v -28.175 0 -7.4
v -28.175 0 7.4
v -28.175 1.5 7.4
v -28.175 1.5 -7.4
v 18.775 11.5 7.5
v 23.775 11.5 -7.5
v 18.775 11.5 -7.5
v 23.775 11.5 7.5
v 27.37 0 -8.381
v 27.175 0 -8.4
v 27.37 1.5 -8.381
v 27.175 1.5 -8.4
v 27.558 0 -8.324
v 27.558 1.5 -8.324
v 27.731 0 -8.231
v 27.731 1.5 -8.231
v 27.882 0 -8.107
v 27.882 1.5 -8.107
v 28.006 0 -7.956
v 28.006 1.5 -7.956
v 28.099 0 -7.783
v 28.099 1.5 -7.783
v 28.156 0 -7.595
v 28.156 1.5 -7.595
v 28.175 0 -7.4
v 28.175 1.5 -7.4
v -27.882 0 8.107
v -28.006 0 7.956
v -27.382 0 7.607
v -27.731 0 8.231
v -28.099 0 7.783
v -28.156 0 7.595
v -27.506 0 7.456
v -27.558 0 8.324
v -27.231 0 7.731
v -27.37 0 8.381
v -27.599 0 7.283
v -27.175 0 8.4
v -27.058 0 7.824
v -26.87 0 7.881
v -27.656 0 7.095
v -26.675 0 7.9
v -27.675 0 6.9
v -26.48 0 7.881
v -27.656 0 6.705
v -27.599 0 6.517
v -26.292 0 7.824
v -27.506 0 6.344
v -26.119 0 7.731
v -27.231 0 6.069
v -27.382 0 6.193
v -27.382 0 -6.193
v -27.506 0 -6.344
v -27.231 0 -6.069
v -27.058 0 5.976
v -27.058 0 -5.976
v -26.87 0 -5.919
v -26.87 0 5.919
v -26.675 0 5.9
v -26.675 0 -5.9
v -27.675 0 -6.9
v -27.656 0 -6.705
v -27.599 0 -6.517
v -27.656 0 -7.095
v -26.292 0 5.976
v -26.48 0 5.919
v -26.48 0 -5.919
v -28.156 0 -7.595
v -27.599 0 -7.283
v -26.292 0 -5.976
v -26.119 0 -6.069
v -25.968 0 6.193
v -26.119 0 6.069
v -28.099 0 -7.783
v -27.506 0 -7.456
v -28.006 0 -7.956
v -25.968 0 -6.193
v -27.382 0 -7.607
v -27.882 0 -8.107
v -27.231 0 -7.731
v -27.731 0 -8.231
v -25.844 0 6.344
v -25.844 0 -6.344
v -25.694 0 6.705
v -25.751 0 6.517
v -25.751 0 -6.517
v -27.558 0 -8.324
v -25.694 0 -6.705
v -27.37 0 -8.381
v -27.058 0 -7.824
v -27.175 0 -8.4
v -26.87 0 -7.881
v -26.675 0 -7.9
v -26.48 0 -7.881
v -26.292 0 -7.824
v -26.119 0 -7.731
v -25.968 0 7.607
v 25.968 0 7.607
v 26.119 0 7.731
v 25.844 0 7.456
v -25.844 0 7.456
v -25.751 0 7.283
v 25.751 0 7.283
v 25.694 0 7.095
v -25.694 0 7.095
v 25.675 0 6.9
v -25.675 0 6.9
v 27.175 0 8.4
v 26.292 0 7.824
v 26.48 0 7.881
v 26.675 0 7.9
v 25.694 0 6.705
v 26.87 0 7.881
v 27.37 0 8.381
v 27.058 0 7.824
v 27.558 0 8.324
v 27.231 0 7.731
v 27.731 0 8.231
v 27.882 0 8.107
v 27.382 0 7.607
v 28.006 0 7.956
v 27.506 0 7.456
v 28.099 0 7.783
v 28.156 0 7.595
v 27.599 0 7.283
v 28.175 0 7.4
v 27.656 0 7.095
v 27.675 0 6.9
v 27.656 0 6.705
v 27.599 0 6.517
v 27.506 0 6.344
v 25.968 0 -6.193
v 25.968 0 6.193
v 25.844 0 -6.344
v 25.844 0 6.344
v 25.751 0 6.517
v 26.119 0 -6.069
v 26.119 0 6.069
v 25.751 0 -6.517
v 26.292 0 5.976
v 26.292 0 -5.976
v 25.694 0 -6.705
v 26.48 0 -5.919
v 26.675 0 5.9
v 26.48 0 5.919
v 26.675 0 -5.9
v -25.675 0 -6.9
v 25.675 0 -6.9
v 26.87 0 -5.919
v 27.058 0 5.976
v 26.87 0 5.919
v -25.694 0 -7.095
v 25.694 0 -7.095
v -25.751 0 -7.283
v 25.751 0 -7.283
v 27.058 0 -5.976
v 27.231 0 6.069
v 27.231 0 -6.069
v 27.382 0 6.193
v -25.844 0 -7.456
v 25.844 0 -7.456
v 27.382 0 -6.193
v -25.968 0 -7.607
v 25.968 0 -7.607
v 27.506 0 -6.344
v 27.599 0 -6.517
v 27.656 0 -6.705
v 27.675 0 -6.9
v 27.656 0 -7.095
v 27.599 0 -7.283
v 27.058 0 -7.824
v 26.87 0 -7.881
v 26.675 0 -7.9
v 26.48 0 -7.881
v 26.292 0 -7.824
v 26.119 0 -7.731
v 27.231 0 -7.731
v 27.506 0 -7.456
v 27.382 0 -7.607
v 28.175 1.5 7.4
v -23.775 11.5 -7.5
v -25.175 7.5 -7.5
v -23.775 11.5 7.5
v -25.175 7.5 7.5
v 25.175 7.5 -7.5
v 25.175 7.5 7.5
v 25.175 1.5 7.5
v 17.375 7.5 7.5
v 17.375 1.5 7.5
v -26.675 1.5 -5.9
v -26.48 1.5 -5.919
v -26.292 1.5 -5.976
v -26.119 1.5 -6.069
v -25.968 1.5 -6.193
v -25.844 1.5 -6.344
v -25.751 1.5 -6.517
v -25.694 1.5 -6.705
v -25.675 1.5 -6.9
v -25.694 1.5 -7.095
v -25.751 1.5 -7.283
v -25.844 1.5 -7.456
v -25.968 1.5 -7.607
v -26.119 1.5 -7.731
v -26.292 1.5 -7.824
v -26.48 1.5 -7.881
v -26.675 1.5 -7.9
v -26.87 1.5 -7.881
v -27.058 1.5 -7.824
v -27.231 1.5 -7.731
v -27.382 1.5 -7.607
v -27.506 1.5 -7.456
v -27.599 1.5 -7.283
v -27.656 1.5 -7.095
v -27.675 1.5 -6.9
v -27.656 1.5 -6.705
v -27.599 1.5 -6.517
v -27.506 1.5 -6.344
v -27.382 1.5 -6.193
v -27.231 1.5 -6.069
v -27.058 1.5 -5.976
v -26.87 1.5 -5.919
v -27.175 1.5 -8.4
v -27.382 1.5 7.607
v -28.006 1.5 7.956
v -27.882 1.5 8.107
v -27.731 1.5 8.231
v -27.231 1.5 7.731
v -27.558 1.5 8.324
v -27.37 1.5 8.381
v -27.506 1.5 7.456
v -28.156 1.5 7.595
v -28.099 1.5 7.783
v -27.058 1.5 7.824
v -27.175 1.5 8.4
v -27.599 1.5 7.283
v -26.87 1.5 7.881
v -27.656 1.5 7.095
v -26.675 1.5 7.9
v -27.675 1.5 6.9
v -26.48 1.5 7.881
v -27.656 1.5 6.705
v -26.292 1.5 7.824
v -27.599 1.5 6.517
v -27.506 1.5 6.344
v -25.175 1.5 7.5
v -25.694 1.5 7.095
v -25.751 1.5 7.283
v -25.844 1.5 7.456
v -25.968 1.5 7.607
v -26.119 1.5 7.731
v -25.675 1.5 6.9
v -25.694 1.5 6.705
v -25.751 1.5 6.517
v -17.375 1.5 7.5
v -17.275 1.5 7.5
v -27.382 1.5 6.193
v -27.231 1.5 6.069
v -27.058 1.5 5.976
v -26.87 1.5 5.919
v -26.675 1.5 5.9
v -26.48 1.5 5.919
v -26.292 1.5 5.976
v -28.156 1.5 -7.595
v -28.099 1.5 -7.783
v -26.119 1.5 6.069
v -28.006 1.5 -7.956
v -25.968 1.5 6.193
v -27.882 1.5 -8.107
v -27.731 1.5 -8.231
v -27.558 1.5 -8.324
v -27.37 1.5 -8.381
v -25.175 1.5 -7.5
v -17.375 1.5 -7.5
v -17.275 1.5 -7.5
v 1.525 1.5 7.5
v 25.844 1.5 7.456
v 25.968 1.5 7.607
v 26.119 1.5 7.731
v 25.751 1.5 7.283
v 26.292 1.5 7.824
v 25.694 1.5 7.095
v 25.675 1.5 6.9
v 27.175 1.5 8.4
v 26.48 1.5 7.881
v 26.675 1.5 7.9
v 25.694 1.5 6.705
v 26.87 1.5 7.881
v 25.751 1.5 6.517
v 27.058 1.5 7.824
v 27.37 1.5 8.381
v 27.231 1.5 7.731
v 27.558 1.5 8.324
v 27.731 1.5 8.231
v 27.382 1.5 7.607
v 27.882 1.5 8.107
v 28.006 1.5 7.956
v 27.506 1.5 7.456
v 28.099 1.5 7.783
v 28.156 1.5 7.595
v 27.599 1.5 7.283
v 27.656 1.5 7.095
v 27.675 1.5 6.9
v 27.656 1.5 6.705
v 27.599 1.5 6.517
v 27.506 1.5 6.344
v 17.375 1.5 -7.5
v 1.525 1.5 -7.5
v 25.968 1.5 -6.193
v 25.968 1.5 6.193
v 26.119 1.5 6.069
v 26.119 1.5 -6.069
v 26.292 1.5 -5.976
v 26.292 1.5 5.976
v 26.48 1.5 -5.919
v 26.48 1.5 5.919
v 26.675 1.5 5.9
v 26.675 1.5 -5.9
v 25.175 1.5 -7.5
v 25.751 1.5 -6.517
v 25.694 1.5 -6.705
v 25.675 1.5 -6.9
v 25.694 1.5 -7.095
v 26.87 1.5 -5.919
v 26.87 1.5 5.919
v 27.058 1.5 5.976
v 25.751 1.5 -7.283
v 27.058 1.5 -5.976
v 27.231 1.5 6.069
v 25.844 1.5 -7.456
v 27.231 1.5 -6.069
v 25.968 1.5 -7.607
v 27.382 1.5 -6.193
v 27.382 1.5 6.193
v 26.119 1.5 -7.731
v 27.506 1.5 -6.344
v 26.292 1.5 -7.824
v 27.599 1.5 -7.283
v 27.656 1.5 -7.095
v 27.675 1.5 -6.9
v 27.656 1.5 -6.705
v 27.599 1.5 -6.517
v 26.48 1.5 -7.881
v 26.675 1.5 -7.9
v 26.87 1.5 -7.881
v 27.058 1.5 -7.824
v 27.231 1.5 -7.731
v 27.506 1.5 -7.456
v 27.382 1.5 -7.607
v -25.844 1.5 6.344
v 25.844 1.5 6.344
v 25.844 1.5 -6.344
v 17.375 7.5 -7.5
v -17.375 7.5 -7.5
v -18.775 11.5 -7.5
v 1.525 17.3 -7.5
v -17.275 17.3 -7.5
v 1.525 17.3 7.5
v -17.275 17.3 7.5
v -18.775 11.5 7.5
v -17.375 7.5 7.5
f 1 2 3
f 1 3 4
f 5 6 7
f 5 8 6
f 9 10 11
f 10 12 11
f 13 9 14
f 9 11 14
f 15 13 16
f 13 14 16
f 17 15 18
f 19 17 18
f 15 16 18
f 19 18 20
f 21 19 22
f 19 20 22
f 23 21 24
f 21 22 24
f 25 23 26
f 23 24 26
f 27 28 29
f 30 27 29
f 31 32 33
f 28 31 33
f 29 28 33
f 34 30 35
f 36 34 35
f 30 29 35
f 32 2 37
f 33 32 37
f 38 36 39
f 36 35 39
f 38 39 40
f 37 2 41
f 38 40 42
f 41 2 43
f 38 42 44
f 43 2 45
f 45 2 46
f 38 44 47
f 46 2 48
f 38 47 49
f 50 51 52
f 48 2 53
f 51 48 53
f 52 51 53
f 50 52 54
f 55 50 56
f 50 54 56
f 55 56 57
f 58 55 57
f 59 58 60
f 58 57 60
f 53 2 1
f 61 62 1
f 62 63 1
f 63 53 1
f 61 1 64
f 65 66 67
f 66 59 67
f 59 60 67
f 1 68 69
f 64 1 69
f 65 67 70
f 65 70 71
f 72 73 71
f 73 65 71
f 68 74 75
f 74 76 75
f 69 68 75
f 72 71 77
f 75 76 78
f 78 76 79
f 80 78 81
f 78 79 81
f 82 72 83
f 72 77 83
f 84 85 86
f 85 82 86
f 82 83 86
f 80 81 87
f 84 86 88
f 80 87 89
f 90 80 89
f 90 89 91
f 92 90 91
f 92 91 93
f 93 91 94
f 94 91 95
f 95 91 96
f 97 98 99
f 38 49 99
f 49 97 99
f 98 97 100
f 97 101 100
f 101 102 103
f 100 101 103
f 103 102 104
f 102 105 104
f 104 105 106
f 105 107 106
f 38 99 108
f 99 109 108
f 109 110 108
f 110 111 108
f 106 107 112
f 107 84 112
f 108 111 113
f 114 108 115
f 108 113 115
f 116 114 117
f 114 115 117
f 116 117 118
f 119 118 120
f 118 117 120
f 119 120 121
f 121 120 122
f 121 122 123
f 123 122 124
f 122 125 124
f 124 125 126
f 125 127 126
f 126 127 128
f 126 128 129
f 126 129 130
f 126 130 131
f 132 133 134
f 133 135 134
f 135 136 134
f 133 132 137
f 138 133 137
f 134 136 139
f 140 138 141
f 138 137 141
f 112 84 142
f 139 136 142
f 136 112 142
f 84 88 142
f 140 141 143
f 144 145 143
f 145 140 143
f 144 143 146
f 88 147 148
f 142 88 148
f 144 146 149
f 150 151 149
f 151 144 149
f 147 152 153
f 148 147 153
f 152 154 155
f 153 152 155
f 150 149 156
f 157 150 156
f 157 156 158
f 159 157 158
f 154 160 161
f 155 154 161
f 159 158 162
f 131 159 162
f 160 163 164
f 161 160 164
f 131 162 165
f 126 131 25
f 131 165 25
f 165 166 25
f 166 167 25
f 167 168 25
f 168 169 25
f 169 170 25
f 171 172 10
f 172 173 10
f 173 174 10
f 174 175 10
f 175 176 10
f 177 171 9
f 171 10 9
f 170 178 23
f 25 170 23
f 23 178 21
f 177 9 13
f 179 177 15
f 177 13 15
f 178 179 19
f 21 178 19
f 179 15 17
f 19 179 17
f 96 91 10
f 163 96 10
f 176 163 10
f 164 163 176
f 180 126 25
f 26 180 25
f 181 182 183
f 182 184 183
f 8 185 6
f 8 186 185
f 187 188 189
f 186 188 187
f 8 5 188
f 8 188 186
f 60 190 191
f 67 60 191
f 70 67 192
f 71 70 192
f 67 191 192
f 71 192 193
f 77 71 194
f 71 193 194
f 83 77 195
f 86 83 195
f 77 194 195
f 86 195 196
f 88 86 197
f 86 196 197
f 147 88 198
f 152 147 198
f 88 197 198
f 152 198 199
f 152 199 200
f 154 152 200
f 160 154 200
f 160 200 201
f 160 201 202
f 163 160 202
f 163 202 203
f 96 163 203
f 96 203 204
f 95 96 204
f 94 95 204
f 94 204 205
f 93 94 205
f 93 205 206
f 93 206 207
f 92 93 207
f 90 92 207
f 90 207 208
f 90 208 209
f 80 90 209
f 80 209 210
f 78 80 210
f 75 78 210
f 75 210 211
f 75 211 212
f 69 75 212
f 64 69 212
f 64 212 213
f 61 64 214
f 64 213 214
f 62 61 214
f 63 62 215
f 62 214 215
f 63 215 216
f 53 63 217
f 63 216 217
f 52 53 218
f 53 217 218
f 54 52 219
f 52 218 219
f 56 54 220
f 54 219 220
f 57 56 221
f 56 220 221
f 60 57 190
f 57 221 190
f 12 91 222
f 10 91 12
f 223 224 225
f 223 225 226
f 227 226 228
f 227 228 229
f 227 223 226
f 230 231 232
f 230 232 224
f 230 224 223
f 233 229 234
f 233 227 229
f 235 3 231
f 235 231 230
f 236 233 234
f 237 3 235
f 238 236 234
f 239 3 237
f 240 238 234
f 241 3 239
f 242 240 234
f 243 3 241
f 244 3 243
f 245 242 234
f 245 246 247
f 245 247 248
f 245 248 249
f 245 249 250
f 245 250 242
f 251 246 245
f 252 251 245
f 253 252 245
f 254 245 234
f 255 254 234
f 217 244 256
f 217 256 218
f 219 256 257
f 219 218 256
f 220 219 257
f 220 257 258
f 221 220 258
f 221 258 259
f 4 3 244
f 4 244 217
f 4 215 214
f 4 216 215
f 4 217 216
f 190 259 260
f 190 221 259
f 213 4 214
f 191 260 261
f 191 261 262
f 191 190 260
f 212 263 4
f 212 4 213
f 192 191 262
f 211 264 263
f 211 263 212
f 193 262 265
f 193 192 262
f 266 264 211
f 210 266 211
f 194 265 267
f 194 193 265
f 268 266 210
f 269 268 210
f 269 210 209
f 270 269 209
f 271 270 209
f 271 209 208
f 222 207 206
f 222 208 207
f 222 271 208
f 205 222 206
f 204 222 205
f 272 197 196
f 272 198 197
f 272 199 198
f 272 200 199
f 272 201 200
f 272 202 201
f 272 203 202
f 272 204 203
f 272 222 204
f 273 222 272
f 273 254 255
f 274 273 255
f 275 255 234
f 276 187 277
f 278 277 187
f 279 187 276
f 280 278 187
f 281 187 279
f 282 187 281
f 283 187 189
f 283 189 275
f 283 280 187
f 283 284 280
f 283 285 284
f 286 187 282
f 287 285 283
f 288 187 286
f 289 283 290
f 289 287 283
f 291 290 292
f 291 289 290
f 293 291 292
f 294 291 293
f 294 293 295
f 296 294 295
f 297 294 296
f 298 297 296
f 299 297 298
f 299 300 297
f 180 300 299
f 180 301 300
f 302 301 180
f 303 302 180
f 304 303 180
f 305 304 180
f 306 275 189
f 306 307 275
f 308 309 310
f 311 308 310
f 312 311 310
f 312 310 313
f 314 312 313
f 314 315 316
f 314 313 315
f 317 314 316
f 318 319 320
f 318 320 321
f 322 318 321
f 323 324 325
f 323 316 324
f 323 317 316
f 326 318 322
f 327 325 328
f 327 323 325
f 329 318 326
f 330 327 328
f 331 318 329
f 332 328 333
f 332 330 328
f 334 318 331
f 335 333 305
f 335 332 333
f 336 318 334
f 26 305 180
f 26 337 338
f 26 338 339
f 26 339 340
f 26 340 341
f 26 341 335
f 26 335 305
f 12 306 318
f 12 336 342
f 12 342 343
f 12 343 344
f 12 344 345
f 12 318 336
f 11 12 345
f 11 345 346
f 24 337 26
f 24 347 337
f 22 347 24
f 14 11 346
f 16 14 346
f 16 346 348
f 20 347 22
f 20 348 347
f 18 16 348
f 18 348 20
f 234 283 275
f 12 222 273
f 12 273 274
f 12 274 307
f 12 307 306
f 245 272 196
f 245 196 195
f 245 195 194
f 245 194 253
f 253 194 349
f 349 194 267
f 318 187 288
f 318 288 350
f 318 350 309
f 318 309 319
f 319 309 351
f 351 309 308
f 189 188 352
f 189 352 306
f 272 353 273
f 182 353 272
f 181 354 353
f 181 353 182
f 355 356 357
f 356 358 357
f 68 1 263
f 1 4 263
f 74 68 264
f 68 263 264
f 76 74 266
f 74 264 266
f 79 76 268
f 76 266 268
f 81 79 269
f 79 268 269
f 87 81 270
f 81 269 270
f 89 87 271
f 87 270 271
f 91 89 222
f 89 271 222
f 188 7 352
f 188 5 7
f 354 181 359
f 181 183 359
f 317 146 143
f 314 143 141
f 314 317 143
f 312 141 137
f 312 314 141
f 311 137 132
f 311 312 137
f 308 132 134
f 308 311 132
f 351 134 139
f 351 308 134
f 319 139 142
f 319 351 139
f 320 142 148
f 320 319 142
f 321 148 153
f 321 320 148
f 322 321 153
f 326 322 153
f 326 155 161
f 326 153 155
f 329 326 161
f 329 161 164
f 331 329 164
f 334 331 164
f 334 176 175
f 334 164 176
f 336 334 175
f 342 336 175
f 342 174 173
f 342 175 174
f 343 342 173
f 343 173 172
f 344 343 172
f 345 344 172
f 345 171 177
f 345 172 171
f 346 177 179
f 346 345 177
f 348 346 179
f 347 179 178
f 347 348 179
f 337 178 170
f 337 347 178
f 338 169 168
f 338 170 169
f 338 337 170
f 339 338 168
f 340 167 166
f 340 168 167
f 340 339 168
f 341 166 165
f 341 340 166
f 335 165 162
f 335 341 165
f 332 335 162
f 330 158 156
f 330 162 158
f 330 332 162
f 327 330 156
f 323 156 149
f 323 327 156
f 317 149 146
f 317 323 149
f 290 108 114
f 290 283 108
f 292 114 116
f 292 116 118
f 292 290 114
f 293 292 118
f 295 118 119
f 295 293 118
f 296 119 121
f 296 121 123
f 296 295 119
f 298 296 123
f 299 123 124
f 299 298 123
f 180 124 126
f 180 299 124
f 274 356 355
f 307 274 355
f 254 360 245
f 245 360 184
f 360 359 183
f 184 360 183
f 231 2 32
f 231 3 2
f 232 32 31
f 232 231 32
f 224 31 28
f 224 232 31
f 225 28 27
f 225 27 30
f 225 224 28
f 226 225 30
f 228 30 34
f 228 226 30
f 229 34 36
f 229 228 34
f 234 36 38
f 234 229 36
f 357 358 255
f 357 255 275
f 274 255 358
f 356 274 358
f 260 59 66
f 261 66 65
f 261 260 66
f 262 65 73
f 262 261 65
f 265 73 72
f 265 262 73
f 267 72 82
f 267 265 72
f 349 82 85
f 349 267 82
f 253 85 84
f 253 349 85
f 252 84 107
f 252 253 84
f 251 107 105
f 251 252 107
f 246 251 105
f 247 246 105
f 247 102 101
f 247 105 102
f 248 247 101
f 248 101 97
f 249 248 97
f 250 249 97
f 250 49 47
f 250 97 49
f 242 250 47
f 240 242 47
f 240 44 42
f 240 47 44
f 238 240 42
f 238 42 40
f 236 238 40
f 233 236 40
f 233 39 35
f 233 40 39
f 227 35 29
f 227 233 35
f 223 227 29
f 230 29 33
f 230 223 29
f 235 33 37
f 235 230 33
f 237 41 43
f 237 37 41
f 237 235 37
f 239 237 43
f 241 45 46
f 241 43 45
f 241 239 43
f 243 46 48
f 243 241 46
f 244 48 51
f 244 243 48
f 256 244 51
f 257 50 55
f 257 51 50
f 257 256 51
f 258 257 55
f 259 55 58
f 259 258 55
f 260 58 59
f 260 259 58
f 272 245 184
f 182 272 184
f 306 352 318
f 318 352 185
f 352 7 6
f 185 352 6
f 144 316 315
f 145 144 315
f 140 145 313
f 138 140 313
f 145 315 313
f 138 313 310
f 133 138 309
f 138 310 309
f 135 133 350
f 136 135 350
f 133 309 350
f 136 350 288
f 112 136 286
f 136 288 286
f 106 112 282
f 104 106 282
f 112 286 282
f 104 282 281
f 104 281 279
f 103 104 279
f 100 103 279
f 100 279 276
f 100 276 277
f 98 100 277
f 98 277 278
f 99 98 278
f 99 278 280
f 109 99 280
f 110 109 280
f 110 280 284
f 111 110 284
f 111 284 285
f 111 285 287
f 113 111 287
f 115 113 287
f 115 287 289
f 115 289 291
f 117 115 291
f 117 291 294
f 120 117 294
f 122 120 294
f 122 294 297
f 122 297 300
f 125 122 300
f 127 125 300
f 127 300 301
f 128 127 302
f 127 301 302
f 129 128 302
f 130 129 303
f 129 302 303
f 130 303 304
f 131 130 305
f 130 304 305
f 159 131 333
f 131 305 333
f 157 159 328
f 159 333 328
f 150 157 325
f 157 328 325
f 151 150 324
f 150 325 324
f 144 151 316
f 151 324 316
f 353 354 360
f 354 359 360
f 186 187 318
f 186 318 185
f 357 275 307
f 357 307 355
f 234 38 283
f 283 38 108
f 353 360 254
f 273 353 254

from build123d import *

# Parameters (mm, degrees)
SKETCH1_W               = 56.35
SKETCH1_H               = 16.8
BOSS_EXTRUDE1_DEPTH     = 1.5
SKETCH2_R               = 1
CUT_EXTRUDE1_DEPTH      = 30.438760589
MIRROR2_COPY_1_SKETCH_R = 1
MIRROR2_COPY_1_DEPTH    = 30.438760589
FILLET1_R               = 1
BOSS_EXTRUDE2_DEPTH     = 7.5
SKETCH4_W               = 18.8
SKETCH4_H               = 15.8
BOSS_EXTRUDE3_DEPTH     = 7.5


with BuildPart() as part:
    # Sketch1 → Boss-Extrude1 (new body)
    with BuildSketch(Plane(origin=(0, 0, 0), x_dir=(1, 0, 0), z_dir=(0, 1, 0))):
        Rectangle(SKETCH1_W, SKETCH1_H)
    extrude(amount=BOSS_EXTRUDE1_DEPTH)

    # Sketch2 → Cut-Extrude1 (cut, through all)
    with BuildSketch(Plane(origin=(0, 1.5, 0), x_dir=(1, 0, 0), z_dir=(0, 1, 0))):
        with Locations(Location((-26.675, 6.9, 0), (0, 0, 270))):
            Circle(SKETCH2_R)
    cut_extrude1 = extrude(amount=-CUT_EXTRUDE1_DEPTH, mode=Mode.SUBTRACT)

    # Mirror1: Cut-Extrude1 across plane
    add(cut_extrude1.mirror(Plane.XY), mode=Mode.SUBTRACT)

    # Mirror2: Cut-Extrude1 across plane
    add(cut_extrude1.mirror(Plane(origin=(0, 0, 0), x_dir=(0, 0, 1), z_dir=(1, 0, 0))), mode=Mode.SUBTRACT)

    # Mirror2 copy 1 sketch → Mirror2 copy 1 (cut, through all)
    with BuildSketch(Plane(origin=(0, 1.5, 0), x_dir=(-1, 0, 0), z_dir=(0, 1, 0))):
        with Locations(Location((-26.675, 6.9, 0), (0, 0, 270))):
            Circle(MIRROR2_COPY_1_SKETCH_R)
    extrude(amount=-MIRROR2_COPY_1_DEPTH, mode=Mode.SUBTRACT)

    # Fillet1
    fillet1_edges = [part.edges().sort_by_distance(p)[0] for p in [
        (28.175, 0.75, 8.4),
        (-28.175, 0.75, 8.4),
        (-28.175, 0.75, -8.4),
        (28.175, 0.75, -8.4),
    ]]
    fillet(fillet1_edges, radius=FILLET1_R)

    # Sketch3 → Boss-Extrude2 (add, symmetric)
    with BuildSketch(Plane.XY):
        Polygon((18.775, 11.5), (17.375, 7.5), (17.375, 1.5), (25.175, 1.5), (25.175, 7.5), (23.775, 11.5), align=None)
    boss_extrude2 = extrude(amount=BOSS_EXTRUDE2_DEPTH, both=True)

    # Mirror3: Boss-Extrude2 across plane
    add(boss_extrude2.mirror(Plane(origin=(0, 0, 0), x_dir=(0, 0, 1), z_dir=(1, 0, 0))))

    # Sketch4 → Boss-Extrude3 (add, symmetric)
    with BuildSketch(Plane.XY):
        with Locations((-7.875, 9.4)):
            Rectangle(SKETCH4_W, SKETCH4_H)
    extrude(amount=BOSS_EXTRUDE3_DEPTH, both=True)


solid = part.part
